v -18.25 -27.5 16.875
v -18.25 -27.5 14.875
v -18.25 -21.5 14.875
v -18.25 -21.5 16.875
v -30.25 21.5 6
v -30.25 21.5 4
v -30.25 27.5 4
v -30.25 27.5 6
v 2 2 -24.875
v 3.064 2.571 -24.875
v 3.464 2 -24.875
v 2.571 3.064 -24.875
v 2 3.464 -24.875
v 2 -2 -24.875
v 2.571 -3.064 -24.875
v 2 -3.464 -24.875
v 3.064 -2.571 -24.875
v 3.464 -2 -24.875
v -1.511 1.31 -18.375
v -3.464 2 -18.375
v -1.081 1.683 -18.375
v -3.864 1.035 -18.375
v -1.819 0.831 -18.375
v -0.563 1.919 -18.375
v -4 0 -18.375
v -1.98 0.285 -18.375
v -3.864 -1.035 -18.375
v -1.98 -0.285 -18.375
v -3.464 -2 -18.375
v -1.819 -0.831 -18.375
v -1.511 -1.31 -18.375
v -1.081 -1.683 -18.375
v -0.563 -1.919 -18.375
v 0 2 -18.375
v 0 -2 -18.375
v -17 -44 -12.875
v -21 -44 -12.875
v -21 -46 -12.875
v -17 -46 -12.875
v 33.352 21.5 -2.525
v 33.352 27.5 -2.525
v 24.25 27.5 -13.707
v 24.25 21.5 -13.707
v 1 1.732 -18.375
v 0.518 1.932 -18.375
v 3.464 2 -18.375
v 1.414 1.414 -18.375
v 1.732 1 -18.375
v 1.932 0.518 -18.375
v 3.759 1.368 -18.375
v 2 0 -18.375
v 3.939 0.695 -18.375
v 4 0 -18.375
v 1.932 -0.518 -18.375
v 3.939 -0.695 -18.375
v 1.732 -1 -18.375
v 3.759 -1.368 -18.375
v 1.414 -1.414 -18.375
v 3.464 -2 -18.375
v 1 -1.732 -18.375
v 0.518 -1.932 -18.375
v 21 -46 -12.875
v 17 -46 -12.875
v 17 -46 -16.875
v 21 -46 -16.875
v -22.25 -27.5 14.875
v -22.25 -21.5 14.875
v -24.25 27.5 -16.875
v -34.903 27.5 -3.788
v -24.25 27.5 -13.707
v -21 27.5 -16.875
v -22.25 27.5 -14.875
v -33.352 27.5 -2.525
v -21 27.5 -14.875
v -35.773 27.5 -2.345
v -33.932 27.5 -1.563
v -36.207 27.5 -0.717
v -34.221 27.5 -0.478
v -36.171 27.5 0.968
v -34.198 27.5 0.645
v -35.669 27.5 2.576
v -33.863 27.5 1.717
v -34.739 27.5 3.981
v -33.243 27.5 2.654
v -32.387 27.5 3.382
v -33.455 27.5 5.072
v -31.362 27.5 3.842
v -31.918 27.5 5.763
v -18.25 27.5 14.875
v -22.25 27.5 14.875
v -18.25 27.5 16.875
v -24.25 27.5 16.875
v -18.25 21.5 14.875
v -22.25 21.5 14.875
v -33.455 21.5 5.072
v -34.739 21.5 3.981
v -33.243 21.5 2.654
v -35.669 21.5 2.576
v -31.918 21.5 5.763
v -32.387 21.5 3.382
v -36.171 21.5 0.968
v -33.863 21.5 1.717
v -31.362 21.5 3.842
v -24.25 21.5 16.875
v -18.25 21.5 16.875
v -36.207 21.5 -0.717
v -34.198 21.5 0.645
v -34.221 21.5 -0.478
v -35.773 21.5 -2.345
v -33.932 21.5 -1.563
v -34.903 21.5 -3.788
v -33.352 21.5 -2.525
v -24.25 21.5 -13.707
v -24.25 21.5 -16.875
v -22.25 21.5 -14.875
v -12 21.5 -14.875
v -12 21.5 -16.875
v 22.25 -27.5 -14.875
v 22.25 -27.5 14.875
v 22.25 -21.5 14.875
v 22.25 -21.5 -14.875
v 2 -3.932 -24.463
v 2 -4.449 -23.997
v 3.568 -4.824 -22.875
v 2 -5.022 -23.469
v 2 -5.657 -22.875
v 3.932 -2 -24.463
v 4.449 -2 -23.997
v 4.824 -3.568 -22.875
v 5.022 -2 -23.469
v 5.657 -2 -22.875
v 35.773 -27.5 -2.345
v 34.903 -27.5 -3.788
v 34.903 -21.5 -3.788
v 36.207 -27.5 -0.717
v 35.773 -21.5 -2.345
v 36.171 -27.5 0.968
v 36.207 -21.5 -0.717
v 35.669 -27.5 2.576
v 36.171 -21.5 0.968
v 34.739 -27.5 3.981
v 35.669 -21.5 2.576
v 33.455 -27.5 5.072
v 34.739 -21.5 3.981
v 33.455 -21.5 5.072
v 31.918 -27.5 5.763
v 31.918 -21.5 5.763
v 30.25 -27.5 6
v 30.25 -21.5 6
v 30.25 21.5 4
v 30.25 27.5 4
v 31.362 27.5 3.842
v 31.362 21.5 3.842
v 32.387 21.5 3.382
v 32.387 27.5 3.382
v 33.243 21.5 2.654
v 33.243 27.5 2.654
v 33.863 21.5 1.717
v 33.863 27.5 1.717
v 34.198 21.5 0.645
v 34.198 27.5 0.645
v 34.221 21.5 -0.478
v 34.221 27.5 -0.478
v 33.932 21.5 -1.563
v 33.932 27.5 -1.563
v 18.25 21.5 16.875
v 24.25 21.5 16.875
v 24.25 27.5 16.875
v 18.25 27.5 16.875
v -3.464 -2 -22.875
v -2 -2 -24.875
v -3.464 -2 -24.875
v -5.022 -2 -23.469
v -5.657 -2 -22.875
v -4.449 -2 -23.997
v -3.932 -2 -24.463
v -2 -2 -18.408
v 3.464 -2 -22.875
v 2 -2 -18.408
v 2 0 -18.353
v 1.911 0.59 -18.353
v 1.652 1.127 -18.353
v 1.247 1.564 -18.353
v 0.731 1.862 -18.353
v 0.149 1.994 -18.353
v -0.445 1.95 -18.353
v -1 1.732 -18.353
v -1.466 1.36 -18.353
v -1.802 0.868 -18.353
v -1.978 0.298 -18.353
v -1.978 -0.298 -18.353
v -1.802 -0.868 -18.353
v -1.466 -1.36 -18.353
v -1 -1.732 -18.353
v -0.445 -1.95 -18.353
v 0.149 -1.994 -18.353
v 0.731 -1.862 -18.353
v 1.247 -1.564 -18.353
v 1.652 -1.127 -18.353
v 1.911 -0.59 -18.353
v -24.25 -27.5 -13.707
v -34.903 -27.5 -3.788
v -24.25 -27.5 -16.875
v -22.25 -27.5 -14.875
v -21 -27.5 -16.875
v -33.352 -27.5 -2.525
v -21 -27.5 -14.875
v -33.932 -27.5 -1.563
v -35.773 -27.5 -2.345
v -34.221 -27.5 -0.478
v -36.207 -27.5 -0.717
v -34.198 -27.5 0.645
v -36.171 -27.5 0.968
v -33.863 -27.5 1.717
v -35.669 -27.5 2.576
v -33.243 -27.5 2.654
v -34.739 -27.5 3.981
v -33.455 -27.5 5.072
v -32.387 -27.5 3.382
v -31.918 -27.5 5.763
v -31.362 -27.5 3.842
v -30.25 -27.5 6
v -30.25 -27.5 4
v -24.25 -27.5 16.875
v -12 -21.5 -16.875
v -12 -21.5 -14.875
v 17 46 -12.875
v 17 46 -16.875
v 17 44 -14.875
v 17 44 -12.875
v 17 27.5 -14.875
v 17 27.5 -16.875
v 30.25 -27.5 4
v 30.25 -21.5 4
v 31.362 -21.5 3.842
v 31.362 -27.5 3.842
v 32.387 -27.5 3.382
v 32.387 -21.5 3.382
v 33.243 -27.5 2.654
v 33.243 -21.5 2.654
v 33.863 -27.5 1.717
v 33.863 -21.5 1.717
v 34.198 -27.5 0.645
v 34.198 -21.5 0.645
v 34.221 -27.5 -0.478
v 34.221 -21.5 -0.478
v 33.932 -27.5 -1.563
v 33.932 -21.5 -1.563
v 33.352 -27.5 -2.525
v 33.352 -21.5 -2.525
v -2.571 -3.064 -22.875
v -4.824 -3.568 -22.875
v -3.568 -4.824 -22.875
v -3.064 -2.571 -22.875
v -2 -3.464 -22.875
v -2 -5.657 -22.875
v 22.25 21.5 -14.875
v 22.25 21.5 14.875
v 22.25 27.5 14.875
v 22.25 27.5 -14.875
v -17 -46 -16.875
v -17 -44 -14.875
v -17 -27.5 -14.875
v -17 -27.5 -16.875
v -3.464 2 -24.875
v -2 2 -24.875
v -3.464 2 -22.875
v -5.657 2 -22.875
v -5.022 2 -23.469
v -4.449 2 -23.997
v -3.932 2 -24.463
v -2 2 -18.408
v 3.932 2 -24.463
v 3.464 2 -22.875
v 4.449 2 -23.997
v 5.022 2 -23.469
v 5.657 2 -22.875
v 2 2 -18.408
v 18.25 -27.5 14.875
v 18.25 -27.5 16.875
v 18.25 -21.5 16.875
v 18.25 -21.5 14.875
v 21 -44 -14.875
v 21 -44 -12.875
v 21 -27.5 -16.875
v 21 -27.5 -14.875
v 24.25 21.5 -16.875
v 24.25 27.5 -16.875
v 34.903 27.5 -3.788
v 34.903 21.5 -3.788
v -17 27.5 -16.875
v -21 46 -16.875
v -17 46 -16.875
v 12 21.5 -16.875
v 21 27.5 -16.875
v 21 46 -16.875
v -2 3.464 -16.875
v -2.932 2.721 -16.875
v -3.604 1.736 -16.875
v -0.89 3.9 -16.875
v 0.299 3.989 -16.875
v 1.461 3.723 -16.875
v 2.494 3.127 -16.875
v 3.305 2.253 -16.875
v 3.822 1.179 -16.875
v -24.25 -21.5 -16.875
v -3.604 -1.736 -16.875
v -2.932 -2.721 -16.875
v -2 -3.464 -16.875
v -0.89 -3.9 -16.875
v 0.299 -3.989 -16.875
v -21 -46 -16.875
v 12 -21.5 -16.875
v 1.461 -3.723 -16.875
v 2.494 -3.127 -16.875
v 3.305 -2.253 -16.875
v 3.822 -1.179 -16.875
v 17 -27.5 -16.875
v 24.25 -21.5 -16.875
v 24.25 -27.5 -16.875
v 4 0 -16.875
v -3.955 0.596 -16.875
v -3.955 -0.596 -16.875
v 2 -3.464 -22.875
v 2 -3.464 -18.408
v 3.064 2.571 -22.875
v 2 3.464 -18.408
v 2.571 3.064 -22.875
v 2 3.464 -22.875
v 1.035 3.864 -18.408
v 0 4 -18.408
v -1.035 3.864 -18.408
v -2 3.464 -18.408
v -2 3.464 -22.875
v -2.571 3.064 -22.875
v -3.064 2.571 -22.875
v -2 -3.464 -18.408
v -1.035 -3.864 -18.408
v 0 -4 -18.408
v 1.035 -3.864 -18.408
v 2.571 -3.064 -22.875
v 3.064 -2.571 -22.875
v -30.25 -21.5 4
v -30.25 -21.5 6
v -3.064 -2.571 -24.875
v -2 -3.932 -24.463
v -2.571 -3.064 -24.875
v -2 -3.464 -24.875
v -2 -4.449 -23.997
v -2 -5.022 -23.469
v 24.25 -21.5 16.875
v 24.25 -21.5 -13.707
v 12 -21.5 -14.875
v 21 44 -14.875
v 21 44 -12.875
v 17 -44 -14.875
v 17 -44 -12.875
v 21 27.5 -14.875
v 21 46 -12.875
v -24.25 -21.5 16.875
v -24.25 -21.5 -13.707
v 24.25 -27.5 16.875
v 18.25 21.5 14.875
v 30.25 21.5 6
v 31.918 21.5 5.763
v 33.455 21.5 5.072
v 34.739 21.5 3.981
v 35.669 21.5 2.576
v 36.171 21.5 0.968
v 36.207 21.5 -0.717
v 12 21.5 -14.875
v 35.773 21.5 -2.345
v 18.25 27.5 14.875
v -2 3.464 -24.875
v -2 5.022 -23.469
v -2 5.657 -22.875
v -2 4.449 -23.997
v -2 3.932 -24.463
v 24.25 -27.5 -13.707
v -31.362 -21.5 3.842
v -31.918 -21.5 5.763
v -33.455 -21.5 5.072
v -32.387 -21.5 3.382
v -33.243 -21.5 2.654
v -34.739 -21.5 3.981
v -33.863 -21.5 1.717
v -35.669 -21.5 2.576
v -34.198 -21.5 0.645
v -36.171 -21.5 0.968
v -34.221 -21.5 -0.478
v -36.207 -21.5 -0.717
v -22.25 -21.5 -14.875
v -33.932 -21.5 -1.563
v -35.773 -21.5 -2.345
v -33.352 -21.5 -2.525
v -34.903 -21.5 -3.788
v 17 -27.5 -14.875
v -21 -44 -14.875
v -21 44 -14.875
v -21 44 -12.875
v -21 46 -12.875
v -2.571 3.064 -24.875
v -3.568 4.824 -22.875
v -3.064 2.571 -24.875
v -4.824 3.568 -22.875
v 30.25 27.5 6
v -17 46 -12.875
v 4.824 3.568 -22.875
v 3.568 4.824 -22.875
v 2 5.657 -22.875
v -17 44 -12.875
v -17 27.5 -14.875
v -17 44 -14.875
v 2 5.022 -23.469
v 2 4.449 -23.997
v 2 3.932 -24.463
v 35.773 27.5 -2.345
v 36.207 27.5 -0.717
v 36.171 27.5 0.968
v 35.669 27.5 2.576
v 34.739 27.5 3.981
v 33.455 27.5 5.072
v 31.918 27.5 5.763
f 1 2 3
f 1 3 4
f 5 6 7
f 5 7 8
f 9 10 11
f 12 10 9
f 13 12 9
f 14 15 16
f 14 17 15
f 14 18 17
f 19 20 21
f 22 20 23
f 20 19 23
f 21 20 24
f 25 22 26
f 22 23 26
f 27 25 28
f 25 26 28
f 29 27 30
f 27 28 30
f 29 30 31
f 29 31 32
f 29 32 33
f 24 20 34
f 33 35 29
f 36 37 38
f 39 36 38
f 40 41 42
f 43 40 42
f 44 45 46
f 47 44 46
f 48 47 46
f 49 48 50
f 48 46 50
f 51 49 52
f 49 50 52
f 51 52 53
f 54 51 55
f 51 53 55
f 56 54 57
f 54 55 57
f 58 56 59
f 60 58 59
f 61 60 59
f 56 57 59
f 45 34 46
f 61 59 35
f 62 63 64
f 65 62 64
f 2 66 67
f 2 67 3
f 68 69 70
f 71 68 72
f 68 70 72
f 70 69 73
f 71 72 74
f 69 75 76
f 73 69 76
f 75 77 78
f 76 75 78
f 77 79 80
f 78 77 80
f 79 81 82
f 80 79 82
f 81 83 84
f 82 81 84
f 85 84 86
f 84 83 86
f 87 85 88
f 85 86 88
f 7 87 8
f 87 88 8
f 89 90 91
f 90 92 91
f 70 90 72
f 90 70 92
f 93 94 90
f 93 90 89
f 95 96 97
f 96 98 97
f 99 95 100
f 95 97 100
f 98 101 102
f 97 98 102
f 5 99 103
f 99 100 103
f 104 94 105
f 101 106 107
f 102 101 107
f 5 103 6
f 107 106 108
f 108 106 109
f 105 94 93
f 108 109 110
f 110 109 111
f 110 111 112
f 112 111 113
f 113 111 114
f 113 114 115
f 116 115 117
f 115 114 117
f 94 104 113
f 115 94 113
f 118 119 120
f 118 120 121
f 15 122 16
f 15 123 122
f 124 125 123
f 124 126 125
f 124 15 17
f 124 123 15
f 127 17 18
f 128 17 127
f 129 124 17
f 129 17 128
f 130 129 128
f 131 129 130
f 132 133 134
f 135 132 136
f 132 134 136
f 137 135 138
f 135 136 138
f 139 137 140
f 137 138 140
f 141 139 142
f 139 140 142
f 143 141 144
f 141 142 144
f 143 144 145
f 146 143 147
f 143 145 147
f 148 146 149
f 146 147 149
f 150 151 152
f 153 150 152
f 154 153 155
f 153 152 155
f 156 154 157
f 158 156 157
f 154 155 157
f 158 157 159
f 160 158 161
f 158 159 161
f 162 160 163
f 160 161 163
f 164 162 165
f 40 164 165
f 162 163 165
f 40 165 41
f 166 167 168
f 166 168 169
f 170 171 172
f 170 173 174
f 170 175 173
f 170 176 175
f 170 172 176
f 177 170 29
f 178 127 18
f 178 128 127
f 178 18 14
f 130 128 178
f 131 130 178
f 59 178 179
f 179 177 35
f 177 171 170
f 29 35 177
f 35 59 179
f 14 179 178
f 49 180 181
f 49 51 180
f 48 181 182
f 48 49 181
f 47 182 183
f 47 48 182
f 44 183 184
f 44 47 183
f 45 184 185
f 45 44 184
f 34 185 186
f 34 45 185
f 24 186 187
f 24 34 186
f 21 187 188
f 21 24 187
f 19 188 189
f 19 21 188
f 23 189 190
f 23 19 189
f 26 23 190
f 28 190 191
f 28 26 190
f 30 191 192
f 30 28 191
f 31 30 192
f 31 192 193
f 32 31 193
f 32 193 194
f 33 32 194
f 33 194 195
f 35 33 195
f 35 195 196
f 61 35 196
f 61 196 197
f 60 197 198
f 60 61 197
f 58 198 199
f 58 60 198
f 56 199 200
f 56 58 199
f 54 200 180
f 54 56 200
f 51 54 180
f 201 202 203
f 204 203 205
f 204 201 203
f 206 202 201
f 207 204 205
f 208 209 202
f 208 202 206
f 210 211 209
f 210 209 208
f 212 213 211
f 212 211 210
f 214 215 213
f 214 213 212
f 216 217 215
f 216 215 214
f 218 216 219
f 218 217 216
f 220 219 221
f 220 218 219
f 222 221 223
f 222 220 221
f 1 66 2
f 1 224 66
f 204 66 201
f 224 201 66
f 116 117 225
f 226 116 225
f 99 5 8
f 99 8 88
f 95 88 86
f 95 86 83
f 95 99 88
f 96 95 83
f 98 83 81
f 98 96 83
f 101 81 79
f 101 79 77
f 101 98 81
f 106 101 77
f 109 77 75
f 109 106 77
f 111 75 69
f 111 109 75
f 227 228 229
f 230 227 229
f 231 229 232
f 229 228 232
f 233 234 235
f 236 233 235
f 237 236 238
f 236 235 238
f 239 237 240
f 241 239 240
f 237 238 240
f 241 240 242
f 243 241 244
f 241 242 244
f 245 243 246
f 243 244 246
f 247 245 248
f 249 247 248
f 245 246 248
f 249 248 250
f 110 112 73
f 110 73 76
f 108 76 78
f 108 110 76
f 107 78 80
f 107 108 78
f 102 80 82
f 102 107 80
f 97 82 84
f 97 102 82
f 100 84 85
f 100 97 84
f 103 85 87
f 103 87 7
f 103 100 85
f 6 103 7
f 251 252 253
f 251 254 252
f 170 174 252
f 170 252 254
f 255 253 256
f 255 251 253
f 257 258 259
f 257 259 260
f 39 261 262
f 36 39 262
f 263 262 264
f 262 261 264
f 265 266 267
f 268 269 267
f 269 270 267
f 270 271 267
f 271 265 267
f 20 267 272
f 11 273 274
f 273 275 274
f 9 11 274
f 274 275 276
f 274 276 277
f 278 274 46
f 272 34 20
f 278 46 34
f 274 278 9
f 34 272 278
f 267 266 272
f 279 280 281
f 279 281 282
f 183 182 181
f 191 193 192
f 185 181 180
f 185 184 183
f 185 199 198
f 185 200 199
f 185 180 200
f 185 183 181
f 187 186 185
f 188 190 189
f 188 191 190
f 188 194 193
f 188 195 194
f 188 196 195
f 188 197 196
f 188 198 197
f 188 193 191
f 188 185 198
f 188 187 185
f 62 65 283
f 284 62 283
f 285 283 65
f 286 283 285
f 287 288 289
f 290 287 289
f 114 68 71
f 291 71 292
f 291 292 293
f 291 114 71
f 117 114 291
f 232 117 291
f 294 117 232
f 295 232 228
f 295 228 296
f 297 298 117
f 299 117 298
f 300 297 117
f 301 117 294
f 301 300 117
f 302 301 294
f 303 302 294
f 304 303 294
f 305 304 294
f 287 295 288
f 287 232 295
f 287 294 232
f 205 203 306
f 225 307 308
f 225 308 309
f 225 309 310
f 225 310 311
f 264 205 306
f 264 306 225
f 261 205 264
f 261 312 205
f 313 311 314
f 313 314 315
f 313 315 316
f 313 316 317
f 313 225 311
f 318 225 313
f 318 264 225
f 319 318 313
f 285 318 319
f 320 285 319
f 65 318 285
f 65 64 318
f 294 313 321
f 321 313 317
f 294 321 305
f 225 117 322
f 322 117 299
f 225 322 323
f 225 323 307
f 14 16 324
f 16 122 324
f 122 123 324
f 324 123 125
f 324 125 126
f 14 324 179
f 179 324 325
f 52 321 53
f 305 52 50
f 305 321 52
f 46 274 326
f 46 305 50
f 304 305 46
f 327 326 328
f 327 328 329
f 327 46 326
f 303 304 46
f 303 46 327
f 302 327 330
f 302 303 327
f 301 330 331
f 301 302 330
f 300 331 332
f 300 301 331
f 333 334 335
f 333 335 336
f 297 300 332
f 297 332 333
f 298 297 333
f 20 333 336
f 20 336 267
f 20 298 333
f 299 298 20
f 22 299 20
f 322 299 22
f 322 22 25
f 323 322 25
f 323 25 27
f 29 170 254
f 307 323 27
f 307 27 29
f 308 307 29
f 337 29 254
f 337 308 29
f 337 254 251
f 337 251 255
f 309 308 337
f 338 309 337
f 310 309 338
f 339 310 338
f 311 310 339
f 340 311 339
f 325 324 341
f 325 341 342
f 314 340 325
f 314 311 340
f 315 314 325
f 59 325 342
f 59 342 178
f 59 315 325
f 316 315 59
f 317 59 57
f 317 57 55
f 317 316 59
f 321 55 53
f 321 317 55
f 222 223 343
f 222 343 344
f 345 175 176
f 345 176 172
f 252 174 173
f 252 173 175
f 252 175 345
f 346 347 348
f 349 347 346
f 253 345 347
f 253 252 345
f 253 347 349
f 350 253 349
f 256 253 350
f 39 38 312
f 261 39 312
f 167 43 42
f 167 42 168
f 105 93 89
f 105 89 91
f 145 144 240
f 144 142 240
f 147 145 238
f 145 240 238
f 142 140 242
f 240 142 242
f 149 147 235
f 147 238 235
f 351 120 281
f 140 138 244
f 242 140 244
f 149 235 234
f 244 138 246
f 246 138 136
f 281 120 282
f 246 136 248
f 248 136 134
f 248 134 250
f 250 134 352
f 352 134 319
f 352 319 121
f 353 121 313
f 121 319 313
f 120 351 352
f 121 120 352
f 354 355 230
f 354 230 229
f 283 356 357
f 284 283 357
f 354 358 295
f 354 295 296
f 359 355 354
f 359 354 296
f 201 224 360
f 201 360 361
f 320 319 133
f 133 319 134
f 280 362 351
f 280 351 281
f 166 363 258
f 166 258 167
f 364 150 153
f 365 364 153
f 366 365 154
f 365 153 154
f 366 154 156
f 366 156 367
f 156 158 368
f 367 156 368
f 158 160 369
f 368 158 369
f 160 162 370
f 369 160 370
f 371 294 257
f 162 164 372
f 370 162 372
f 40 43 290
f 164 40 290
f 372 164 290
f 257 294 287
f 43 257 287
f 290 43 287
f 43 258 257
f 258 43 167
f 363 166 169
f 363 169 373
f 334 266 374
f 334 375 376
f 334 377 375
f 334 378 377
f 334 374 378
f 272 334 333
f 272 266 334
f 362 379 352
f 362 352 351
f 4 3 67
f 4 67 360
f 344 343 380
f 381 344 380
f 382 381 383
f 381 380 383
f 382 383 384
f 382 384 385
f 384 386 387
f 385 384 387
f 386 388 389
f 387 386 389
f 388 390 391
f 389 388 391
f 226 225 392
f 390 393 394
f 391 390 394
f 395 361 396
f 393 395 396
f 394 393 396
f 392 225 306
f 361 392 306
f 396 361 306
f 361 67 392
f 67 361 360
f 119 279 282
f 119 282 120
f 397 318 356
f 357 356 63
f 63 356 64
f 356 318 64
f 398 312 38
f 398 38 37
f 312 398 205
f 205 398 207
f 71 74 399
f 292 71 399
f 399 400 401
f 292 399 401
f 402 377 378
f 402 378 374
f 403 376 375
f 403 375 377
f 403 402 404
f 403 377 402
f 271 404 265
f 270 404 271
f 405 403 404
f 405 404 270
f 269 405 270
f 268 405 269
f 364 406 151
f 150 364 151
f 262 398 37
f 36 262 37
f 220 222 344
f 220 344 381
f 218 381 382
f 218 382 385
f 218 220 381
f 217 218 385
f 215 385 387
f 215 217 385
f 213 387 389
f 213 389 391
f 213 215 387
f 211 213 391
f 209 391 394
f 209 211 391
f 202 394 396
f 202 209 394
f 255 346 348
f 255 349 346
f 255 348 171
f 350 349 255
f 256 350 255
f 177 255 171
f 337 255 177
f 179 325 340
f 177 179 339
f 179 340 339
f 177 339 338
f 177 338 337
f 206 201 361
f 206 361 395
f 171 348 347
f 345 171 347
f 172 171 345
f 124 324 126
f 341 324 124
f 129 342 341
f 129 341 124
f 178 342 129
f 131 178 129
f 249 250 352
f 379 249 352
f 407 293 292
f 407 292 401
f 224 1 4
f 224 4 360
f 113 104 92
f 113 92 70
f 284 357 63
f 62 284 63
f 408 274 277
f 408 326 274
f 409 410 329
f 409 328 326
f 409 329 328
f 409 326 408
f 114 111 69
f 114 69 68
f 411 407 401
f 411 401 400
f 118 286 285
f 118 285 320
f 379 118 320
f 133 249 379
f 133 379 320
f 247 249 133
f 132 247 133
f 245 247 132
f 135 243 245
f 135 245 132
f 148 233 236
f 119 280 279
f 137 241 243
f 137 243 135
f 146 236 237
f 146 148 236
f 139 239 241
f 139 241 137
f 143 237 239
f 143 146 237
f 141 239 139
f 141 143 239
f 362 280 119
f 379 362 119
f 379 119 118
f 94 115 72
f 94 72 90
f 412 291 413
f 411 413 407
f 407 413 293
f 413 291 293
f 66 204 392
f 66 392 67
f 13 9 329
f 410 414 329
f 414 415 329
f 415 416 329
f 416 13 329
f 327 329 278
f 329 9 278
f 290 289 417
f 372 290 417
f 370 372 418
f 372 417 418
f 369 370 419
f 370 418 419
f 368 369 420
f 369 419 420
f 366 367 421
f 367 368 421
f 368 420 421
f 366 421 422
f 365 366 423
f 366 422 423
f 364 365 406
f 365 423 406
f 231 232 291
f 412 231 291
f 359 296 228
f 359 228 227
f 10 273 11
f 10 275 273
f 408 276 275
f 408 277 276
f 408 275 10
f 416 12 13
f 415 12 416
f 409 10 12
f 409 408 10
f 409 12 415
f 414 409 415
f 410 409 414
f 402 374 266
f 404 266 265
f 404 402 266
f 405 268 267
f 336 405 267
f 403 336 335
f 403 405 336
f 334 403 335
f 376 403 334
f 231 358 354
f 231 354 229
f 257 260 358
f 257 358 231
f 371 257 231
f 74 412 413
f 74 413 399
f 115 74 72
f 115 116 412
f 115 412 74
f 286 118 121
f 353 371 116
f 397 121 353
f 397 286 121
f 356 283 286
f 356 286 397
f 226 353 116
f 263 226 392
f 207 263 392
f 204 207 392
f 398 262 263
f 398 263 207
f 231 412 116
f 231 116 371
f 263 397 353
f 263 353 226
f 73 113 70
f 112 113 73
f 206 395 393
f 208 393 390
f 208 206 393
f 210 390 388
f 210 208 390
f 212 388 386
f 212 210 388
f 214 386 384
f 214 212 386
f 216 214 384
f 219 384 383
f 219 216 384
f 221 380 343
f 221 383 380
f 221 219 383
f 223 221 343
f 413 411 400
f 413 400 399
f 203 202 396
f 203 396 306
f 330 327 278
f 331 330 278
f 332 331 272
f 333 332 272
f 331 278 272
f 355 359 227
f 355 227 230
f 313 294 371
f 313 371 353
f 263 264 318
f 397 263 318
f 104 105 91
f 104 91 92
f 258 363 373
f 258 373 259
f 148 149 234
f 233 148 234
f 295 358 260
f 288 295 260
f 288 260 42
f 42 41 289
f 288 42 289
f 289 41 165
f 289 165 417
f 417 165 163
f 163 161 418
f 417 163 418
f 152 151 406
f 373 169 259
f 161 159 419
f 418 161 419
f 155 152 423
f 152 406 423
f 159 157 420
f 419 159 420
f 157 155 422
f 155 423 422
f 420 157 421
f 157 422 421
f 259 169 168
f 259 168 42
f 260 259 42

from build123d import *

# Parameters (mm, degrees)
F3_DEPTH  = 27.5
F5_DEPTH  = 27.5
F4_W      = 15.75
F4_H      = 43
F4_W_2    = 12.25
F6_DEPTH  = 33.751
F8_DEPTH  = 21
F10_DEPTH = 33.751
F11_W     = 2
F11_H     = 6.5
F12_DEPTH = 10
F13_W     = 2
F13_H     = 6.5
F14_DEPTH = 12.5


with BuildPart() as f1:
    # F0 (on Front) → F1 (revolve)
    with BuildSketch(Plane.XZ):
        Polygon((2, -16.875), (0, -16.875), (0, -18.3531418443), (2, -18.3531418443), (2, -24.875), (4, -24.875), (6, -22.875), (4, -22.875), (4, -16.875), align=None)
    revolve(axis=Axis((0, 0, -17.6140709221), (0, 0, 1)))

    # F0 (on Front) → F3 (join, symmetric)
    with BuildSketch(Plane.XZ):
        Polygon((-22.25, -14.875), (-22.25, 14.875), (-18.25, 14.875), (-18.25, 16.875), (-24.25, 16.875), (-24.25, -16.875), (0, -16.875), (2, -16.875), (4, -16.875), (24.25, -16.875), (24.25, 16.875), (18.25, 16.875), (18.25, 14.875), (22.25, 14.875), (22.25, -14.875), align=None)
    extrude(amount=F3_DEPTH, both=True)

    # F2 (on Front) → F5 (join, symmetric)
    with BuildSketch(Plane.XZ):
        with BuildLine():
            ThreePointArc((30.25, 4), (33.8625360184, 1.7174351563), (33.3521481806, -2.525208242))
            Line((33.3521481806, -2.525208242), (24.25, -13.7069444444))
            Line((24.25, -13.7069444444), (24.25, -16.875))
            Line((24.25, -16.875), (34.9032222709, -3.787812363))
            ThreePointArc((34.9032222709, -3.787812363), (35.6688040276, 2.5761527344), (30.25, 6))
            Line((30.25, 6), (30.25, 4))
        make_face()
        with BuildLine():
            ThreePointArc((-30.25, 6), (-35.6688040276, 2.5761527344), (-34.9032222709, -3.787812363))
            Line((-34.9032222709, -3.787812363), (-24.25, -16.875))
            Line((-24.25, -16.875), (-24.25, -13.7069444444))
            Line((-24.25, -13.7069444444), (-33.3521481806, -2.525208242))
            ThreePointArc((-33.3521481806, -2.525208242), (-33.8625360184, 1.7174351563), (-30.25, 4))
            Line((-30.25, 4), (-30.25, 6))
        make_face()
    extrude(amount=F5_DEPTH, both=True)

    # F4 (on face) → F6 (cut, through all)
    with BuildSketch(Plane(origin=(0, 0, -16.875), x_dir=(1, 0, 0), z_dir=(0, 0, -1))):
        with Locations((-32.125, 0)):
            Rectangle(F4_W, F4_H)
        with Locations((-18.125, 0)):
            Rectangle(F4_W_2, F4_H)
        with Locations((18.125, 0)):
            Rectangle(F4_W_2, F4_H)
        with Locations((32.125, 0)):
            Rectangle(F4_W, F4_H)
    extrude(amount=-F6_DEPTH, mode=Mode.SUBTRACT)

    # F7 (on Right) → F8 (join, symmetric)
    with BuildSketch(Plane.YZ):
        Polygon((-46, -16.875), (-27.5, -16.875), (-27.5, -14.875), (-44, -14.875), (-44, -12.875), (-46, -12.875), align=None)
        Polygon((46, -16.875), (46, -12.875), (44, -12.875), (44, -14.875), (27.5, -14.875), (27.5, -16.875), align=None)
    extrude(amount=F8_DEPTH, both=True)

    # F9 (on face) → F10 (cut, through all)
    with BuildSketch(Plane(origin=(0, 0, -16.875), x_dir=(1, 0, 0), z_dir=(0, 0, -1))):
        Polygon((17, 46), (-17, 46), (-17, 27.5), (0, 27.5), (17, 27.5), align=None)
        Polygon((-17, -27.5), (-17, -46), (17, -46), (17, -27.5), (0, -27.5), align=None)
    extrude(amount=-F10_DEPTH, mode=Mode.SUBTRACT)

    # F11 (on Front) → F12 (cut, symmetric)
    with BuildSketch(Plane.XZ):
        with Locations((1, -21.6578255147)):
            Rectangle(F11_W, F11_H)
        with Locations((-1, -21.6578255147)):
            Rectangle(F11_W, F11_H)
    extrude(amount=F12_DEPTH, both=True, mode=Mode.SUBTRACT)

    # F13 (on Right) → F14 (cut, symmetric)
    with BuildSketch(Plane.YZ):
        with Locations((1, -21.625)):
            Rectangle(F13_W, F13_H)
        with Locations((-1, -21.625)):
            Rectangle(F13_W, F13_H)
    extrude(amount=F14_DEPTH, both=True, mode=Mode.SUBTRACT)


solid = f1.part
